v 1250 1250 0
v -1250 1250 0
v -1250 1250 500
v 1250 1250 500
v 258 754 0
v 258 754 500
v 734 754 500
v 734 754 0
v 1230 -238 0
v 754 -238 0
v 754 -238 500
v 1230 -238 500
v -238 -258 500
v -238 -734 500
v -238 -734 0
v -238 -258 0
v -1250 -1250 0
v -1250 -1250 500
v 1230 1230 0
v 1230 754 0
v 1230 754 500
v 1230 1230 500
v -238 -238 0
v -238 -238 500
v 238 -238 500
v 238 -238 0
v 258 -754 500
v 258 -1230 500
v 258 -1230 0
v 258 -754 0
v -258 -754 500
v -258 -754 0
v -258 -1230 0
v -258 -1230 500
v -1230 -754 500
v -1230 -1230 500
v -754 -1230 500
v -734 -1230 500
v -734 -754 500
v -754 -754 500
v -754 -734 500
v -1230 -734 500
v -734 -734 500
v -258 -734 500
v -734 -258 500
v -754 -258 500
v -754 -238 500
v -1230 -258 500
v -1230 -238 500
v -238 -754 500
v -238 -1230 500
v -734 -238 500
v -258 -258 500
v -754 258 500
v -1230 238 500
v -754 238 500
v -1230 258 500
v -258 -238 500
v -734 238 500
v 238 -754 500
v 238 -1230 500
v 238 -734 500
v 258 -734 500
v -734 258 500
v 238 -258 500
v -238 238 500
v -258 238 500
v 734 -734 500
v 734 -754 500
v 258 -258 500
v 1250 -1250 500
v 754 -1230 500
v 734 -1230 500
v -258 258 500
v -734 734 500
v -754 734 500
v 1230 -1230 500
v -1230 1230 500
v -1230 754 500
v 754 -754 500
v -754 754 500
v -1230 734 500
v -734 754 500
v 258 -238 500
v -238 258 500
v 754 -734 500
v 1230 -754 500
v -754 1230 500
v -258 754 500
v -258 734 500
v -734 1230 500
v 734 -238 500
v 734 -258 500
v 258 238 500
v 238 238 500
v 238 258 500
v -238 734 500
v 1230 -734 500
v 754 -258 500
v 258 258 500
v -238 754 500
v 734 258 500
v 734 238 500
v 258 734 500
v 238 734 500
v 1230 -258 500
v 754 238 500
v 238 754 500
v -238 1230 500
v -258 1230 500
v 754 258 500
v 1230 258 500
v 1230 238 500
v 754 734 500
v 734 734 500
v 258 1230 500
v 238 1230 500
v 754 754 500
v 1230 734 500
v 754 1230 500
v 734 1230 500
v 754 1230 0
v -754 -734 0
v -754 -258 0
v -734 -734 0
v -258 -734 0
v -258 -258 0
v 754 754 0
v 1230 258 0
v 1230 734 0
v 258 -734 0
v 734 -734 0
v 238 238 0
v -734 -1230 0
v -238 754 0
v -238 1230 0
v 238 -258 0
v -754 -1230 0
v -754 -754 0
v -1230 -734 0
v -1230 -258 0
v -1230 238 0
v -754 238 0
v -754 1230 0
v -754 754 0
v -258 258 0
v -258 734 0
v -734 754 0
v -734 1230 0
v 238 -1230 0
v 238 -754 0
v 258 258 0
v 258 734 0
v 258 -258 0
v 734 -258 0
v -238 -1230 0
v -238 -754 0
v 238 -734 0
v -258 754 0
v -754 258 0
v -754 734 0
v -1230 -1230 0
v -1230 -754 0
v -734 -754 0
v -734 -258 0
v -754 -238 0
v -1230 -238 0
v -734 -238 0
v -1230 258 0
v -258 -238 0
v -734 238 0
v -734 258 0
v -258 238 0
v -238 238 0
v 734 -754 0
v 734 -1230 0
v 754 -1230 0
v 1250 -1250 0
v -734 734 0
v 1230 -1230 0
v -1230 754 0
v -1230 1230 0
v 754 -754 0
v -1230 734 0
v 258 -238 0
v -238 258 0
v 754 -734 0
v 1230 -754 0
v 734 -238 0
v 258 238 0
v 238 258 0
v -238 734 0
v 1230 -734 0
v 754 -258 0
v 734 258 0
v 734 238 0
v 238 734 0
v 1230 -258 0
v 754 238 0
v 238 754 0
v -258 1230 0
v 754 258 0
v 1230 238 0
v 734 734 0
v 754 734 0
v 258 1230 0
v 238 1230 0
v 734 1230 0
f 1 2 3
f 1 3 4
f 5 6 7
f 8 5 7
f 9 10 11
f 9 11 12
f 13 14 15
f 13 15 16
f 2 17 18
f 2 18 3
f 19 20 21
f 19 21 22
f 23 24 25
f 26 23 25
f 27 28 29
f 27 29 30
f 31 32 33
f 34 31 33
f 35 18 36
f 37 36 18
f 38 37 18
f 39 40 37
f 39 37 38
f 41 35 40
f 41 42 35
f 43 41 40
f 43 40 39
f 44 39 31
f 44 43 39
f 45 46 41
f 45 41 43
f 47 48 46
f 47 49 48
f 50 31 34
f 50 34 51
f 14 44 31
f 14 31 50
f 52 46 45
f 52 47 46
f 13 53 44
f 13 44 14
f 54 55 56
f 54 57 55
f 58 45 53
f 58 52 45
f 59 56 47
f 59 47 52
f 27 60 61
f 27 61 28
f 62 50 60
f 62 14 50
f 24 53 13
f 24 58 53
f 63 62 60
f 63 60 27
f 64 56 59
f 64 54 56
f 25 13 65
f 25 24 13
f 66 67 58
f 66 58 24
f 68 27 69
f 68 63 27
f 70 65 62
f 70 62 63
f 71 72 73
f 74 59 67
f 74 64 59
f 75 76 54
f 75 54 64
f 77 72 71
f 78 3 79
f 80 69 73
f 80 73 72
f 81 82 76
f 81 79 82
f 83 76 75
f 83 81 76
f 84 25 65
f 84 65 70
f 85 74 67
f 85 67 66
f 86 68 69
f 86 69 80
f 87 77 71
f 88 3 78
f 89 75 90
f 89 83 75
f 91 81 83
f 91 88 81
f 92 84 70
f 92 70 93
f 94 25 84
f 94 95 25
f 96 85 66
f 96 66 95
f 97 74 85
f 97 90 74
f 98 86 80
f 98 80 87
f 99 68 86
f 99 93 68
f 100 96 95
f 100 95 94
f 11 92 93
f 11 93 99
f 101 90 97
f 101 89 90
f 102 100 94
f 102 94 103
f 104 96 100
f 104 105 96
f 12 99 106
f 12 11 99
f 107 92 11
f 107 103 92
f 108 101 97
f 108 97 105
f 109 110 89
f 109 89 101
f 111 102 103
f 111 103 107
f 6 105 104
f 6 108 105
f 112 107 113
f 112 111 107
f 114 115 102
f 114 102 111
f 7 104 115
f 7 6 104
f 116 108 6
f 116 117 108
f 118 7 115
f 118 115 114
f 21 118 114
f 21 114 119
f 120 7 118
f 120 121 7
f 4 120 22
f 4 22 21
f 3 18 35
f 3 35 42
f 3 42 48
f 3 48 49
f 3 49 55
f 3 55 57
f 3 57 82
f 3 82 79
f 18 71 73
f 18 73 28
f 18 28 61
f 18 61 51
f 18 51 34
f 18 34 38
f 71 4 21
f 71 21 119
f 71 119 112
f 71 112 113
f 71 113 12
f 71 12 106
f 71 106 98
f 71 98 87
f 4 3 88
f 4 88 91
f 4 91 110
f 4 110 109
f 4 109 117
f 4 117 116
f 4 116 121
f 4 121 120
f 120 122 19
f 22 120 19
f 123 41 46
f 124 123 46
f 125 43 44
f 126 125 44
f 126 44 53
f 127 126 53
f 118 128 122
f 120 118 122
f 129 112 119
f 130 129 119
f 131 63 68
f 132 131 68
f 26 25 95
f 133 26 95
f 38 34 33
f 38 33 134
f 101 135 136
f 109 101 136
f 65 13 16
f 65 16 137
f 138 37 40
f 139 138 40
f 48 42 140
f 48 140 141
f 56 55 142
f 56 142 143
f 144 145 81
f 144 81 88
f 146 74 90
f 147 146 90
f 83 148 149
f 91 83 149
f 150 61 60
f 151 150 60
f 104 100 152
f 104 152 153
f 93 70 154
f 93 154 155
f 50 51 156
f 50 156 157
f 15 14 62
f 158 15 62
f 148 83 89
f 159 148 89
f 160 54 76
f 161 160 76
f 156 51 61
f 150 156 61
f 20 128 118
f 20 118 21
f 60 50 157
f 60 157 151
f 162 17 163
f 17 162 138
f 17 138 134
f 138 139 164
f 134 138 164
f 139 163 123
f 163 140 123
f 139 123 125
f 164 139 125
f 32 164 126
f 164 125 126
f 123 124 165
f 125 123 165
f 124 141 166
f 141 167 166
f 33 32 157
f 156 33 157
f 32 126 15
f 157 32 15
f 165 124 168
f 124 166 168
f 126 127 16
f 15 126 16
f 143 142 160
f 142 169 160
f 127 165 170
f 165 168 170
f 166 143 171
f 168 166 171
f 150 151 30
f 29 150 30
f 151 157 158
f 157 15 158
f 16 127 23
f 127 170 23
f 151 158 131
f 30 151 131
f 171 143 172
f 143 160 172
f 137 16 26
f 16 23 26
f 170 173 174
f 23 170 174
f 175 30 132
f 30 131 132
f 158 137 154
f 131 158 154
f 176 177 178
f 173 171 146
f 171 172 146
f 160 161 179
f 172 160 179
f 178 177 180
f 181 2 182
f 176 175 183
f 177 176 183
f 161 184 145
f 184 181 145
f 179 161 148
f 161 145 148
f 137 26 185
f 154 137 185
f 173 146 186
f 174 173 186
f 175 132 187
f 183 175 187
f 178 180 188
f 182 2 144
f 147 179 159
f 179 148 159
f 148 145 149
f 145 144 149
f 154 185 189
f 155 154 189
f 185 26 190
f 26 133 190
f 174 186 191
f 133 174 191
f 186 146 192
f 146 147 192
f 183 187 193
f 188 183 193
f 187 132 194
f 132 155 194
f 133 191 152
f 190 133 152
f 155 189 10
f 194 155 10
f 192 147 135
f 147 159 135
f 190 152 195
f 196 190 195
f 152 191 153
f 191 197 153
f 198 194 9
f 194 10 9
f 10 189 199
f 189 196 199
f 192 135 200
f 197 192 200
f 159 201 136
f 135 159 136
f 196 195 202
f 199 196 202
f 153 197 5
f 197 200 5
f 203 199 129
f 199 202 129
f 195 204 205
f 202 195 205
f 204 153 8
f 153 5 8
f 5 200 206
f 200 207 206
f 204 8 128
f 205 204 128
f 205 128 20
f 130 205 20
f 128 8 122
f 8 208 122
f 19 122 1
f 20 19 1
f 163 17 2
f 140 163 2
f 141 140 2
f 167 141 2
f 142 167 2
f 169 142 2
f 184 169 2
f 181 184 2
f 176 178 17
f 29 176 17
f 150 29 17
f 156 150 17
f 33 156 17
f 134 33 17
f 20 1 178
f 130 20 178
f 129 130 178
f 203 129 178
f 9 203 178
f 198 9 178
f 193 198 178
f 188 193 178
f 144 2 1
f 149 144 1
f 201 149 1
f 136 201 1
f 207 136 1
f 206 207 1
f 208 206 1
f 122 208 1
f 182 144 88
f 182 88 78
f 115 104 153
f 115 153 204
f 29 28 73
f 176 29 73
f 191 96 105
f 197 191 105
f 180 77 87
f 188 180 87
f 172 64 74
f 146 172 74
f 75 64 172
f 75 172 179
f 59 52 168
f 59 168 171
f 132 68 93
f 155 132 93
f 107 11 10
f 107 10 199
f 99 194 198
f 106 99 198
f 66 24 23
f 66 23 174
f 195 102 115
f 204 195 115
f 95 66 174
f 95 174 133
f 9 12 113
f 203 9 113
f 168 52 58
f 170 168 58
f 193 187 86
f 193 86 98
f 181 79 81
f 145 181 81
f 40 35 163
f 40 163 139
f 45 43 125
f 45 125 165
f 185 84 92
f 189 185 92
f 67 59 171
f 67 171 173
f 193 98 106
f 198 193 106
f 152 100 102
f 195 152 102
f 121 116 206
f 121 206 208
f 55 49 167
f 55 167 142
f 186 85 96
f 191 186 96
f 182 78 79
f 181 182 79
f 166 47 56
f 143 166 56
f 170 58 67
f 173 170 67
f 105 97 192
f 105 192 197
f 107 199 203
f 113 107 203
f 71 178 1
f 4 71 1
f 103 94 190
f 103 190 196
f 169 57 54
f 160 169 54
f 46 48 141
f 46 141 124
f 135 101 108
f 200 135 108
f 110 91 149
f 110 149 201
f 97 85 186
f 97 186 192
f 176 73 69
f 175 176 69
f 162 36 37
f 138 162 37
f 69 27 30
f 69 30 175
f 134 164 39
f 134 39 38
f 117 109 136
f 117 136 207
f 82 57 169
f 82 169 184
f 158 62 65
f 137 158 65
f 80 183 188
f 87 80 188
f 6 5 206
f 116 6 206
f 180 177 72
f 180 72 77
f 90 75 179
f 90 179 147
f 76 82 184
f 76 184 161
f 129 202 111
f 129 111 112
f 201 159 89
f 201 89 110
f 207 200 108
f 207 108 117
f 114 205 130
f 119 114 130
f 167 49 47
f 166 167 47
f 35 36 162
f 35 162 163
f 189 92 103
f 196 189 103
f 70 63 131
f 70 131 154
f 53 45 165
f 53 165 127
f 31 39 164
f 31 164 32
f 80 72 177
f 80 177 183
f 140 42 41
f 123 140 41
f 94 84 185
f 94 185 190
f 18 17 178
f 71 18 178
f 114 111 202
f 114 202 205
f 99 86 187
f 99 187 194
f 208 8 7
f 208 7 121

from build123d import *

# Parameters (mm, degrees)
SKETCH1_W           = 2500
SKETCH1_H           = 2500
BOSS_EXTRUDE1_DEPTH = 500
SKETCH3_W           = 476
SKETCH3_H           = 476
CUT_EXTRUDE2_DEPTH  = 1838.117307087


with BuildPart() as part:
    # Sketch1 → Boss-Extrude1 (new body)
    with BuildSketch(Plane.XY):
        Rectangle(SKETCH1_W, SKETCH1_H)
    extrude(amount=BOSS_EXTRUDE1_DEPTH)

    # Sketch3 → Cut-Extrude2 (cut, through all)
    with BuildSketch(Plane.XY.offset(500)):
        Polygon((-754, 1230), (-1230, 1230), (-1230, 754), (-754, 754), (-754, 774.812783864), align=None)
        with Locations((-992, 496)):
            Rectangle(SKETCH3_W, SKETCH3_H)
        with Locations((-992, 0)):
            Rectangle(SKETCH3_W, SKETCH3_H)
        with Locations((-496, 992)):
            Rectangle(SKETCH3_W, SKETCH3_H)
        with Locations((-496, 496)):
            Rectangle(SKETCH3_W, SKETCH3_H)
        with Locations((-496, 0)):
            Rectangle(SKETCH3_W, SKETCH3_H)
        with Locations((-992, -496)):
            Rectangle(SKETCH3_W, SKETCH3_H)
        with Locations((-496, -496)):
            Rectangle(SKETCH3_W, SKETCH3_H)
        Polygon((-258, -754), (-258, -1230), (-734, -1230), (-734, -1170.804779694), (-734, -754), align=None)
        with Locations((-992, -992)):
            Rectangle(SKETCH3_W, SKETCH3_H)
        with Locations((0, -992)):
            Rectangle(SKETCH3_W, SKETCH3_H)
        with Locations((0, -496)):
            Rectangle(SKETCH3_W, SKETCH3_H)
        Rectangle(SKETCH3_W, SKETCH3_H)
        with Locations((0, 496)):
            Rectangle(SKETCH3_W, SKETCH3_H)
        with Locations((0, 992)):
            Rectangle(SKETCH3_W, SKETCH3_H)
        with Locations((496, 992)):
            Rectangle(SKETCH3_W, SKETCH3_H)
        with Locations((496, 496)):
            Rectangle(SKETCH3_W, SKETCH3_H)
        with Locations((496, 0)):
            Rectangle(SKETCH3_W, SKETCH3_H)
        with Locations((496, -496)):
            Rectangle(SKETCH3_W, SKETCH3_H)
        with Locations((496, -992)):
            Rectangle(SKETCH3_W, SKETCH3_H)
        with Locations((992, -992)):
            Rectangle(SKETCH3_W, SKETCH3_H)
        with Locations((992, -496)):
            Rectangle(SKETCH3_W, SKETCH3_H)
        with Locations((992, 0)):
            Rectangle(SKETCH3_W, SKETCH3_H)
        with Locations((992, 496)):
            Rectangle(SKETCH3_W, SKETCH3_H)
        with Locations((992, 992)):
            Rectangle(SKETCH3_W, SKETCH3_H)
    extrude(amount=-CUT_EXTRUDE2_DEPTH, mode=Mode.SUBTRACT)


solid = part.part
